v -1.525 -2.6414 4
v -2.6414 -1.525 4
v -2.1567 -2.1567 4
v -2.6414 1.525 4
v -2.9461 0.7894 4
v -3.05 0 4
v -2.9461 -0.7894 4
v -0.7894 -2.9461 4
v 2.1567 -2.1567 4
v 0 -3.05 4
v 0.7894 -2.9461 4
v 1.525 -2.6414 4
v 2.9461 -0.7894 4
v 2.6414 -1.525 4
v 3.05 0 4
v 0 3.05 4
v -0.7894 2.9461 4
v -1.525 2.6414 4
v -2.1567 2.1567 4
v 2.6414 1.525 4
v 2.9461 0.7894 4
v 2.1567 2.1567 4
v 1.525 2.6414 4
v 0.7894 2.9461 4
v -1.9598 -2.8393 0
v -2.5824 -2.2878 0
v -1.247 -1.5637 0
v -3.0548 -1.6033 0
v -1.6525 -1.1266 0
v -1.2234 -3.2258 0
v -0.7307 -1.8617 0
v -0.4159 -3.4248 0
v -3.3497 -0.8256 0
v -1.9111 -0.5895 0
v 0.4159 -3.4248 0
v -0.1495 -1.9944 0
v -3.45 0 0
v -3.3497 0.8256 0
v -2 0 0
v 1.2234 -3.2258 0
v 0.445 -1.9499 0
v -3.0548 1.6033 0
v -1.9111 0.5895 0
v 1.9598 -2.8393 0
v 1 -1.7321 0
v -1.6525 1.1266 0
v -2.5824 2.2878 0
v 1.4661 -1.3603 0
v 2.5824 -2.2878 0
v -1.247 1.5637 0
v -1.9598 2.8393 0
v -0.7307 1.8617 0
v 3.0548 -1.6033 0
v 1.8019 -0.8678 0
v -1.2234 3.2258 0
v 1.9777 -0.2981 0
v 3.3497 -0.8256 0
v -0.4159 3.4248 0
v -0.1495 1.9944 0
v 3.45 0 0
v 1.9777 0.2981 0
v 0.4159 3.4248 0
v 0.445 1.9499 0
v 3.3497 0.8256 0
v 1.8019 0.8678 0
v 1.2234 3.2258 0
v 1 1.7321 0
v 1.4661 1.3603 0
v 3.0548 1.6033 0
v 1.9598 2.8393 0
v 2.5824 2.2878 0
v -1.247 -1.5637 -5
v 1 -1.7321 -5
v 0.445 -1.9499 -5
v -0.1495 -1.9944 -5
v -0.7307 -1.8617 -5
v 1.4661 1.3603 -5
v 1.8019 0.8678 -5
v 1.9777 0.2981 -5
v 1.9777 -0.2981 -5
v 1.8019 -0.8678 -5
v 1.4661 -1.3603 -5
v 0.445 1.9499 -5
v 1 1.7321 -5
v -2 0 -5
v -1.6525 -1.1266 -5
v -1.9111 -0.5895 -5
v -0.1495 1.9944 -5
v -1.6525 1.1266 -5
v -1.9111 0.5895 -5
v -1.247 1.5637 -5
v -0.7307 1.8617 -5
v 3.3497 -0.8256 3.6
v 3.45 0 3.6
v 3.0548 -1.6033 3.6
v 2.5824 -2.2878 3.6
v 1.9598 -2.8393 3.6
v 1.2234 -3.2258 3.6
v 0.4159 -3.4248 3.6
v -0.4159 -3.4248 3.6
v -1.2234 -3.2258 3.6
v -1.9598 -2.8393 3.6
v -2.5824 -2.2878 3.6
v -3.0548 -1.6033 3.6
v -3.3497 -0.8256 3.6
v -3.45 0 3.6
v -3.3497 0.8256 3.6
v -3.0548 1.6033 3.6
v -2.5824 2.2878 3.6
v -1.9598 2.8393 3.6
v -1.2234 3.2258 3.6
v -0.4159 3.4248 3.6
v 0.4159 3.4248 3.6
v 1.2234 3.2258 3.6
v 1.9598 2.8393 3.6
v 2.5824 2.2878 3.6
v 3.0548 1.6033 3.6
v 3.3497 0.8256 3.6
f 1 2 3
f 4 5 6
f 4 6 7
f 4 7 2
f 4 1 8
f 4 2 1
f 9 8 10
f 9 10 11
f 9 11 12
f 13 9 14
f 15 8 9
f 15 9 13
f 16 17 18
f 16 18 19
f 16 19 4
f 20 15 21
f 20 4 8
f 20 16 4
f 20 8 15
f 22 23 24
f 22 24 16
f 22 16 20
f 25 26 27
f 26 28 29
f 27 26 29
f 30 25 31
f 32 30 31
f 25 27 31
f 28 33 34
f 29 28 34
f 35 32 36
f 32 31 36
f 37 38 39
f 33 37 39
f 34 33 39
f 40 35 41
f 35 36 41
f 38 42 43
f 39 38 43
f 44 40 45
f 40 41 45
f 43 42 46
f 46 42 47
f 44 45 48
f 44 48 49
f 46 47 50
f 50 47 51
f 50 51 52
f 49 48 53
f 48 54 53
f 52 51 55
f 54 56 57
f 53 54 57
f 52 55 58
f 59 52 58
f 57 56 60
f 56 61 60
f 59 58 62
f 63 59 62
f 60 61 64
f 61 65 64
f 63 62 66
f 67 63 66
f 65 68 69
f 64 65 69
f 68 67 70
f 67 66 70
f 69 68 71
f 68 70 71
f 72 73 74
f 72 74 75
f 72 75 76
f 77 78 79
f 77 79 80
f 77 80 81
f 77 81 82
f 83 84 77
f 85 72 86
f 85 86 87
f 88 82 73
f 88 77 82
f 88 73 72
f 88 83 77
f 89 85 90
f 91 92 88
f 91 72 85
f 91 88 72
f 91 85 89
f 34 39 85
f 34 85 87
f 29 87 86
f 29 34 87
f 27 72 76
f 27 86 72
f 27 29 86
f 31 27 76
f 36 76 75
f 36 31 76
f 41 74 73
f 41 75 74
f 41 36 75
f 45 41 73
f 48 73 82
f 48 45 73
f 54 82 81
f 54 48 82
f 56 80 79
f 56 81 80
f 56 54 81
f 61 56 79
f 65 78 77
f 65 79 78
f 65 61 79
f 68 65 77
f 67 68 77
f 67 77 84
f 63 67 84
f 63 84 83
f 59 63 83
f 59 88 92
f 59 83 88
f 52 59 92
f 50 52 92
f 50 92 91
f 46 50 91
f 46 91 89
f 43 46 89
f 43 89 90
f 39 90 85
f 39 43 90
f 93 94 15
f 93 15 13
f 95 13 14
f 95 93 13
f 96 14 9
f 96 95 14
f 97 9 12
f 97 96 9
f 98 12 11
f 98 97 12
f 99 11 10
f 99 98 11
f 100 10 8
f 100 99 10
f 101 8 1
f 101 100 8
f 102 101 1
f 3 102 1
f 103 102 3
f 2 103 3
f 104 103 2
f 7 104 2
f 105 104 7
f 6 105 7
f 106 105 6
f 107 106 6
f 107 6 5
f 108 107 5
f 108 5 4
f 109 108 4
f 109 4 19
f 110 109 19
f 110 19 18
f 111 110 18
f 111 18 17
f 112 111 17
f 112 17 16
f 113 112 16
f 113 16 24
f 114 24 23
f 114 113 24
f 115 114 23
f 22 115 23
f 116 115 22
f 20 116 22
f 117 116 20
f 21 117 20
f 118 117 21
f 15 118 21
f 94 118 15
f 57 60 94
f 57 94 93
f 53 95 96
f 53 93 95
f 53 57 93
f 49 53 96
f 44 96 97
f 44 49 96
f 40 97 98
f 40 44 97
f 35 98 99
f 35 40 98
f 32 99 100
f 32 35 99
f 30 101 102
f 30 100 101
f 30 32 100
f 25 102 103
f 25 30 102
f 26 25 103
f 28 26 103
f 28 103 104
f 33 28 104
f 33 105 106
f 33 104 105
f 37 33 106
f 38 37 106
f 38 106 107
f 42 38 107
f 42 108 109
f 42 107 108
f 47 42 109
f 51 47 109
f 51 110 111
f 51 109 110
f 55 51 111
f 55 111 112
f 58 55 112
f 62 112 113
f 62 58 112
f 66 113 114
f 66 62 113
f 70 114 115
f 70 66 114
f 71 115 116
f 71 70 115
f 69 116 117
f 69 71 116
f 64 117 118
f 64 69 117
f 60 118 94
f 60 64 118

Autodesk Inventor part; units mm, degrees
ref_plane "YZ Plane" through (0, 0, 0) normal (1, 0, 0) x (0, 1, 0)
ref_plane "XZ Plane" through (0, 0, 0) normal (0, 1, 0) x (-1, 0, 0)
ref_plane "XY Plane" through (0, 0, 0) normal (0, 0, 1) x (1, 0, 0)
sketch "スケッチ1" plane through (0, 0, 0) normal (0, 0, 1) x (1, 0, 0)
  circle A0 centre (0, 0) radius 3.45
  dimension "d0" = 6.9
extrude "押し出し1" add sketch "スケッチ1" along normal blind 4
sketch "スケッチ2" plane through (0, 0, 0) normal (0, 0, -1) x (-1, 0, 0)
  circle A0 centre (0, 0) radius 2
  dimension "d3" = 4
extrude "押し出し2" add sketch "スケッチ2" along normal blind 5
thread "ねじ1" size "M4x0.7" class "6g" standard "ANSI Metric M Profile" full length
chamfer "面取り1" distance 0.4 angle 45 1 edges at (-3.45, 0, 4)
properties part number "M4×5" material "ステンレス鋼"
